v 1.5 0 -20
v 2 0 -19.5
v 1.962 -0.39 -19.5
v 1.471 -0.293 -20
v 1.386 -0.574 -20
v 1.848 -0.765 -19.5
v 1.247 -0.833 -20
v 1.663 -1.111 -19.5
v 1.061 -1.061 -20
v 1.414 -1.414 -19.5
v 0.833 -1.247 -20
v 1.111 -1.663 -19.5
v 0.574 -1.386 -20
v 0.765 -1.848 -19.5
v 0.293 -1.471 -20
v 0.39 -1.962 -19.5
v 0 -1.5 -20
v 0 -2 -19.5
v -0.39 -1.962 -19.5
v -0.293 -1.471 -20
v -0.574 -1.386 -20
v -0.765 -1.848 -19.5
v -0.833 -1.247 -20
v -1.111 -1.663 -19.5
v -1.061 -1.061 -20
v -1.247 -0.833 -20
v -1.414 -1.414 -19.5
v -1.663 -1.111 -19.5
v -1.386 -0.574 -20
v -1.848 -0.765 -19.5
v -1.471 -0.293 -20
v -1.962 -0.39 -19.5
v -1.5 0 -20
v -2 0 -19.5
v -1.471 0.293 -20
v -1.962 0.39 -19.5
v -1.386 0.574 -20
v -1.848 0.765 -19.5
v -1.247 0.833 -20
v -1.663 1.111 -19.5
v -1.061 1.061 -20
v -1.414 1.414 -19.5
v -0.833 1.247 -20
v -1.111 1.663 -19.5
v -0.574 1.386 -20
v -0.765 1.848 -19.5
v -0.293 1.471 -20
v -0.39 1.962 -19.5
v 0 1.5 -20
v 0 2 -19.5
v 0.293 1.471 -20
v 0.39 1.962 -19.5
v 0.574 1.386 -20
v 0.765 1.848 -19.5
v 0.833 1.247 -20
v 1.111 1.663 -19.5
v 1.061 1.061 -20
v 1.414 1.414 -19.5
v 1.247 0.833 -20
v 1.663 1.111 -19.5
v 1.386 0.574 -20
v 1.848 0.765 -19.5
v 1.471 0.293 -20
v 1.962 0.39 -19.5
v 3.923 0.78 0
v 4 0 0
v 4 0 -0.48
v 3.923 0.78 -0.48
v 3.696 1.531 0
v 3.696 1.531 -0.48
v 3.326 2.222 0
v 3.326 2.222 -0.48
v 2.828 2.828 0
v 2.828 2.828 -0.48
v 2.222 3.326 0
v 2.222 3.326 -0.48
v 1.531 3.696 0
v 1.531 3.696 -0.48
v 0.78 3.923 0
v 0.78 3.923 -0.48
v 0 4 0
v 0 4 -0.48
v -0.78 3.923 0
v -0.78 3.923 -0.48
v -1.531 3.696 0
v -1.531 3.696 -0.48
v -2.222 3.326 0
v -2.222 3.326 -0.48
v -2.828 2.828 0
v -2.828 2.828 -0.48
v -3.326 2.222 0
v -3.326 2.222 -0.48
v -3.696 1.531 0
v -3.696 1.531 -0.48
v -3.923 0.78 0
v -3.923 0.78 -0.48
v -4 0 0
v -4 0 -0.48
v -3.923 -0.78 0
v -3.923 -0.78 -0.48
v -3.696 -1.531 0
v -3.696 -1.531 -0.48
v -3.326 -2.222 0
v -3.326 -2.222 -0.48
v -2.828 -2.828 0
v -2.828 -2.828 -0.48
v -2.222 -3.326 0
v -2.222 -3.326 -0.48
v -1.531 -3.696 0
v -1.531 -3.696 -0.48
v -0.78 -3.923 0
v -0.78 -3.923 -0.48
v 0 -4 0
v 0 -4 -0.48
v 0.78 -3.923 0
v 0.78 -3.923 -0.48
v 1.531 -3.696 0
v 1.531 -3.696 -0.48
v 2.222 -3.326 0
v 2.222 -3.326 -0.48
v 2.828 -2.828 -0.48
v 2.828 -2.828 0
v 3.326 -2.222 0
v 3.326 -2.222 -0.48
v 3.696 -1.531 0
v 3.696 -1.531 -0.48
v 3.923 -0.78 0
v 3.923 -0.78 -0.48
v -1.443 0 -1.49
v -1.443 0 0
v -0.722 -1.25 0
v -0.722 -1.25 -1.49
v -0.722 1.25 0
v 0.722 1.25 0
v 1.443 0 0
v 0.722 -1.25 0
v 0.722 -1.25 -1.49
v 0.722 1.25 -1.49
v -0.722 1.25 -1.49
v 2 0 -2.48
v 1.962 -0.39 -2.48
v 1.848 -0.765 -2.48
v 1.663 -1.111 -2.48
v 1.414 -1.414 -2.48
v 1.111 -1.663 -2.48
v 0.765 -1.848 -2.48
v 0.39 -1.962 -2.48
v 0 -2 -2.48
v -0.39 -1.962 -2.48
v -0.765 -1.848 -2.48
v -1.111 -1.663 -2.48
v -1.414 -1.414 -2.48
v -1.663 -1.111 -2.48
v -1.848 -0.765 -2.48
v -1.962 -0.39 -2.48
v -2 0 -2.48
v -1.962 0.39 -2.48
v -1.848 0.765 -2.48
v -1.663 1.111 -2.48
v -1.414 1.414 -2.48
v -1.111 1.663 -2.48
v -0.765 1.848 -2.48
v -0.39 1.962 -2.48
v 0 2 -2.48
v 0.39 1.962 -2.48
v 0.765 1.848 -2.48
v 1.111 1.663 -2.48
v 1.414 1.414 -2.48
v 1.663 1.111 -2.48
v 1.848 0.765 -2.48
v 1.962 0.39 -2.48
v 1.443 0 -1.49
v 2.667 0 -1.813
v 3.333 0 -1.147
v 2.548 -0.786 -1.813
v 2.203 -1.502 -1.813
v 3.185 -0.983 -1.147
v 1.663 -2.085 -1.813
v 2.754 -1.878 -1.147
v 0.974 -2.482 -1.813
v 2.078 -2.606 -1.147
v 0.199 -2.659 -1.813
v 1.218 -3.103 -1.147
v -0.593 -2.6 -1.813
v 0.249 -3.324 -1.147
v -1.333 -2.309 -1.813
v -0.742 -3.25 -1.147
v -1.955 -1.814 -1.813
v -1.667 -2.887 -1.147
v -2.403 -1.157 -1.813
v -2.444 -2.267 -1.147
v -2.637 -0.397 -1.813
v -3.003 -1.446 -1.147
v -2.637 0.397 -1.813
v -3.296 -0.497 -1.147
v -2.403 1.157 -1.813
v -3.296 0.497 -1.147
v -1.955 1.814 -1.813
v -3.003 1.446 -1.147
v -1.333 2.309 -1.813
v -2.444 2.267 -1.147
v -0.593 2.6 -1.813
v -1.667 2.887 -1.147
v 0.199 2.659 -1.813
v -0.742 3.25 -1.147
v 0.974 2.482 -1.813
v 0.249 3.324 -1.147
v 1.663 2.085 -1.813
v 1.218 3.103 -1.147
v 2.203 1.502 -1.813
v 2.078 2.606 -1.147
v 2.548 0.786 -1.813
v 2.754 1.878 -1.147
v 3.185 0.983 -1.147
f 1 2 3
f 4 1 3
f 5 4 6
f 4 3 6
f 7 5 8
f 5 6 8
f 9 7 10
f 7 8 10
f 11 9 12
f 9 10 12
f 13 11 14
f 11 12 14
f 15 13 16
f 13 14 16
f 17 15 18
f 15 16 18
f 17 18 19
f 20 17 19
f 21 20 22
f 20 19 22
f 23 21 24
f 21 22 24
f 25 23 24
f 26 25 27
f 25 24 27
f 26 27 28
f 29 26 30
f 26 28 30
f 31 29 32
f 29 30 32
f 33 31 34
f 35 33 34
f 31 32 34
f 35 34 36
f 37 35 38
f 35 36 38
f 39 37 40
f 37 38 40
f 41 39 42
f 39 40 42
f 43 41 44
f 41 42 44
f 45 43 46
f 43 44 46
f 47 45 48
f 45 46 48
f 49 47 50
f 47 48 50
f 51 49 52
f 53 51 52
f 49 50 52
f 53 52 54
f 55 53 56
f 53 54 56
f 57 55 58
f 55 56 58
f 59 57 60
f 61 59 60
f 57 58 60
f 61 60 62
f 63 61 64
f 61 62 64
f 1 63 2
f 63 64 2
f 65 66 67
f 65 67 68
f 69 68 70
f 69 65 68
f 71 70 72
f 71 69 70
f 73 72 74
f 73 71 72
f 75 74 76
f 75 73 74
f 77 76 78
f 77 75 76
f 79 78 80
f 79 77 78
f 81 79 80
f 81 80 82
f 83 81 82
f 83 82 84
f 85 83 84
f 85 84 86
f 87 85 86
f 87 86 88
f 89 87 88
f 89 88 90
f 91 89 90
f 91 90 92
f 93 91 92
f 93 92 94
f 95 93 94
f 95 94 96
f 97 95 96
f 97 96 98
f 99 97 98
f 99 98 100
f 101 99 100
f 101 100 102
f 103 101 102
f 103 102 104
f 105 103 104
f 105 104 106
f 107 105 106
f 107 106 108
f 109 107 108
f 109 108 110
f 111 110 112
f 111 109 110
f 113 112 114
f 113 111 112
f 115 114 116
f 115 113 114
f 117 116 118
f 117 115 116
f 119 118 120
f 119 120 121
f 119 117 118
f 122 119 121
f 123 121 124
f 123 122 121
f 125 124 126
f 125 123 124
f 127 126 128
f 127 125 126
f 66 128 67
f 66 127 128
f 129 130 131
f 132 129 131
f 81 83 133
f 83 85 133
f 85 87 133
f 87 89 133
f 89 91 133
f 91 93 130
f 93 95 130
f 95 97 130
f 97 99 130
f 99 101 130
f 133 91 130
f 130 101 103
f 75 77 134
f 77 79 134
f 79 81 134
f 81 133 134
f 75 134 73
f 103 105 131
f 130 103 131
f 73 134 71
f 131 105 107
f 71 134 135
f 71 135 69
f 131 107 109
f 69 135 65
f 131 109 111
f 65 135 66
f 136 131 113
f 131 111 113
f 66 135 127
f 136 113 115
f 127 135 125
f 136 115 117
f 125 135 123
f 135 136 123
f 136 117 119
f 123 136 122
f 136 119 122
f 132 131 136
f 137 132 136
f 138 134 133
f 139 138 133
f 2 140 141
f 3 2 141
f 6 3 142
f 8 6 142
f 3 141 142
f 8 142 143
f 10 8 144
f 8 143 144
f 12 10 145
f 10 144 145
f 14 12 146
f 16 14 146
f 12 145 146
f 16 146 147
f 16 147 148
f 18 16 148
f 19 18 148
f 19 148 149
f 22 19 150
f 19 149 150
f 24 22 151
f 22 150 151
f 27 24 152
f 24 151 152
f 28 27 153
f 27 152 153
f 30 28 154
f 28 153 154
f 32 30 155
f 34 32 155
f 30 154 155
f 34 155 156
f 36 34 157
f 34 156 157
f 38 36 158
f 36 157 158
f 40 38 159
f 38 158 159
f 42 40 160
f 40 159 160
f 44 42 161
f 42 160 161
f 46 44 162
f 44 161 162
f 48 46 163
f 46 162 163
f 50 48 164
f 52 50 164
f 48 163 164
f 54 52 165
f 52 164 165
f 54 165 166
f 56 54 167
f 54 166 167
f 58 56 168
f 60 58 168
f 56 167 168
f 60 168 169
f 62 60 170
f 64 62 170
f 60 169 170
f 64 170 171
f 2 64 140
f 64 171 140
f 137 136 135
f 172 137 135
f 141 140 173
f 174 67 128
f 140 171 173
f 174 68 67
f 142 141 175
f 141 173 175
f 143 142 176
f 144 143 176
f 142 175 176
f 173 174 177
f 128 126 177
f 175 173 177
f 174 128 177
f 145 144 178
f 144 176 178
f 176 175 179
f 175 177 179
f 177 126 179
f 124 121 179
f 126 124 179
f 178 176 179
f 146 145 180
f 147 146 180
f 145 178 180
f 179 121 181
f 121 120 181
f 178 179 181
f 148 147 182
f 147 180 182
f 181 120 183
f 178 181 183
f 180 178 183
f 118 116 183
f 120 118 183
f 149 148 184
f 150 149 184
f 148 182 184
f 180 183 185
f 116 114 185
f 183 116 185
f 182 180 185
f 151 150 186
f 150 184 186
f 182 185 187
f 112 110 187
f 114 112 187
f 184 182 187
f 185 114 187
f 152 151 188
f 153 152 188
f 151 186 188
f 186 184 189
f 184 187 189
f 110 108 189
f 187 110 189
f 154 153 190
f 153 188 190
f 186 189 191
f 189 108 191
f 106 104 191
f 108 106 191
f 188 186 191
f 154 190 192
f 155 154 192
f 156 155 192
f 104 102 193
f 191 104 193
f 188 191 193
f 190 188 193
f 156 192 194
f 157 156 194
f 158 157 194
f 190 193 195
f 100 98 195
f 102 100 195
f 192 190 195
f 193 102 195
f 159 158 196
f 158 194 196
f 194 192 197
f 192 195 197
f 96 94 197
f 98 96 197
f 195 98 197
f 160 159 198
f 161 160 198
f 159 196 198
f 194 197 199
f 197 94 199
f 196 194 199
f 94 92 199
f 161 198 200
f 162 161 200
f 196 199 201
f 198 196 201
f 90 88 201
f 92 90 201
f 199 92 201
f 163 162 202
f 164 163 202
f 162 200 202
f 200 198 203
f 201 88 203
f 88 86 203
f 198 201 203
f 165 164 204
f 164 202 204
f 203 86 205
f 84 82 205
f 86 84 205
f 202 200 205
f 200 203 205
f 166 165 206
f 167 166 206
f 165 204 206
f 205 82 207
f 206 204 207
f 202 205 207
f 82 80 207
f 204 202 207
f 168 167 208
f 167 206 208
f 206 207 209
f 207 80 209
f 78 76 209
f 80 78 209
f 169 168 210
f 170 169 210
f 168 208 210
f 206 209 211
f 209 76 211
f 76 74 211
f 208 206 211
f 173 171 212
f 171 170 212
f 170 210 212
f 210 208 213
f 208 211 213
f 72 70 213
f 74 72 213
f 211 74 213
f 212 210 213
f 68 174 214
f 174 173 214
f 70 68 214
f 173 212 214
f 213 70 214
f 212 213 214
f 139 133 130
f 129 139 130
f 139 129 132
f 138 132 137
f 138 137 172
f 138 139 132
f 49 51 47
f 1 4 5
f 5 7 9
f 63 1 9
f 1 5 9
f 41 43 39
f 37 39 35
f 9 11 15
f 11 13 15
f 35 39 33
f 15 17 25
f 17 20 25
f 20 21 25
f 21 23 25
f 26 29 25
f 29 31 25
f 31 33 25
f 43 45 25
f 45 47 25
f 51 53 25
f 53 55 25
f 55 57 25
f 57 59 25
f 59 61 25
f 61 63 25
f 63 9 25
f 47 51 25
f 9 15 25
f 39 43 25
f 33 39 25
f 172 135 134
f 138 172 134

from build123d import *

# Parameters (mm, degrees)
F2_SIZE  = 0.5
F3_R     = 4.48
F3_R_2   = 4
F4_DEPTH = 1.49


with BuildPart() as f1:
    # F0 (on Front) → F1 (revolve)
    with BuildSketch(Plane.XZ):
        Polygon((4.48, 0), (0, 0), (0, -4.48), (2, -2.48), align=None)
        Polygon((2, -2.48), (0, -4.48), (0, -20), (2, -20), align=None)
    revolve(axis=Axis((0, 0, -10), (0, 0, -1)))

    # F2
    f2_edges = [f1.edges().sort_by_distance(p)[0] for p in [
        (-2, 0, -20),
    ]]
    chamfer(f2_edges, length=F2_SIZE)

    # F3 (on Top) → F4 (cut)
    with BuildSketch(Plane.XY):
        Circle(F3_R)
        Circle(F3_R_2, mode=Mode.SUBTRACT)
        Polygon((0.7216878365, 1.25), (-0.7216878365, 1.25), (-1.443375673, 0), (-0.7216878365, -1.25), (0.7216878365, -1.25), (1.443375673, 0), align=None)
    extrude(amount=-F4_DEPTH, mode=Mode.SUBTRACT)


solid = f1.part
